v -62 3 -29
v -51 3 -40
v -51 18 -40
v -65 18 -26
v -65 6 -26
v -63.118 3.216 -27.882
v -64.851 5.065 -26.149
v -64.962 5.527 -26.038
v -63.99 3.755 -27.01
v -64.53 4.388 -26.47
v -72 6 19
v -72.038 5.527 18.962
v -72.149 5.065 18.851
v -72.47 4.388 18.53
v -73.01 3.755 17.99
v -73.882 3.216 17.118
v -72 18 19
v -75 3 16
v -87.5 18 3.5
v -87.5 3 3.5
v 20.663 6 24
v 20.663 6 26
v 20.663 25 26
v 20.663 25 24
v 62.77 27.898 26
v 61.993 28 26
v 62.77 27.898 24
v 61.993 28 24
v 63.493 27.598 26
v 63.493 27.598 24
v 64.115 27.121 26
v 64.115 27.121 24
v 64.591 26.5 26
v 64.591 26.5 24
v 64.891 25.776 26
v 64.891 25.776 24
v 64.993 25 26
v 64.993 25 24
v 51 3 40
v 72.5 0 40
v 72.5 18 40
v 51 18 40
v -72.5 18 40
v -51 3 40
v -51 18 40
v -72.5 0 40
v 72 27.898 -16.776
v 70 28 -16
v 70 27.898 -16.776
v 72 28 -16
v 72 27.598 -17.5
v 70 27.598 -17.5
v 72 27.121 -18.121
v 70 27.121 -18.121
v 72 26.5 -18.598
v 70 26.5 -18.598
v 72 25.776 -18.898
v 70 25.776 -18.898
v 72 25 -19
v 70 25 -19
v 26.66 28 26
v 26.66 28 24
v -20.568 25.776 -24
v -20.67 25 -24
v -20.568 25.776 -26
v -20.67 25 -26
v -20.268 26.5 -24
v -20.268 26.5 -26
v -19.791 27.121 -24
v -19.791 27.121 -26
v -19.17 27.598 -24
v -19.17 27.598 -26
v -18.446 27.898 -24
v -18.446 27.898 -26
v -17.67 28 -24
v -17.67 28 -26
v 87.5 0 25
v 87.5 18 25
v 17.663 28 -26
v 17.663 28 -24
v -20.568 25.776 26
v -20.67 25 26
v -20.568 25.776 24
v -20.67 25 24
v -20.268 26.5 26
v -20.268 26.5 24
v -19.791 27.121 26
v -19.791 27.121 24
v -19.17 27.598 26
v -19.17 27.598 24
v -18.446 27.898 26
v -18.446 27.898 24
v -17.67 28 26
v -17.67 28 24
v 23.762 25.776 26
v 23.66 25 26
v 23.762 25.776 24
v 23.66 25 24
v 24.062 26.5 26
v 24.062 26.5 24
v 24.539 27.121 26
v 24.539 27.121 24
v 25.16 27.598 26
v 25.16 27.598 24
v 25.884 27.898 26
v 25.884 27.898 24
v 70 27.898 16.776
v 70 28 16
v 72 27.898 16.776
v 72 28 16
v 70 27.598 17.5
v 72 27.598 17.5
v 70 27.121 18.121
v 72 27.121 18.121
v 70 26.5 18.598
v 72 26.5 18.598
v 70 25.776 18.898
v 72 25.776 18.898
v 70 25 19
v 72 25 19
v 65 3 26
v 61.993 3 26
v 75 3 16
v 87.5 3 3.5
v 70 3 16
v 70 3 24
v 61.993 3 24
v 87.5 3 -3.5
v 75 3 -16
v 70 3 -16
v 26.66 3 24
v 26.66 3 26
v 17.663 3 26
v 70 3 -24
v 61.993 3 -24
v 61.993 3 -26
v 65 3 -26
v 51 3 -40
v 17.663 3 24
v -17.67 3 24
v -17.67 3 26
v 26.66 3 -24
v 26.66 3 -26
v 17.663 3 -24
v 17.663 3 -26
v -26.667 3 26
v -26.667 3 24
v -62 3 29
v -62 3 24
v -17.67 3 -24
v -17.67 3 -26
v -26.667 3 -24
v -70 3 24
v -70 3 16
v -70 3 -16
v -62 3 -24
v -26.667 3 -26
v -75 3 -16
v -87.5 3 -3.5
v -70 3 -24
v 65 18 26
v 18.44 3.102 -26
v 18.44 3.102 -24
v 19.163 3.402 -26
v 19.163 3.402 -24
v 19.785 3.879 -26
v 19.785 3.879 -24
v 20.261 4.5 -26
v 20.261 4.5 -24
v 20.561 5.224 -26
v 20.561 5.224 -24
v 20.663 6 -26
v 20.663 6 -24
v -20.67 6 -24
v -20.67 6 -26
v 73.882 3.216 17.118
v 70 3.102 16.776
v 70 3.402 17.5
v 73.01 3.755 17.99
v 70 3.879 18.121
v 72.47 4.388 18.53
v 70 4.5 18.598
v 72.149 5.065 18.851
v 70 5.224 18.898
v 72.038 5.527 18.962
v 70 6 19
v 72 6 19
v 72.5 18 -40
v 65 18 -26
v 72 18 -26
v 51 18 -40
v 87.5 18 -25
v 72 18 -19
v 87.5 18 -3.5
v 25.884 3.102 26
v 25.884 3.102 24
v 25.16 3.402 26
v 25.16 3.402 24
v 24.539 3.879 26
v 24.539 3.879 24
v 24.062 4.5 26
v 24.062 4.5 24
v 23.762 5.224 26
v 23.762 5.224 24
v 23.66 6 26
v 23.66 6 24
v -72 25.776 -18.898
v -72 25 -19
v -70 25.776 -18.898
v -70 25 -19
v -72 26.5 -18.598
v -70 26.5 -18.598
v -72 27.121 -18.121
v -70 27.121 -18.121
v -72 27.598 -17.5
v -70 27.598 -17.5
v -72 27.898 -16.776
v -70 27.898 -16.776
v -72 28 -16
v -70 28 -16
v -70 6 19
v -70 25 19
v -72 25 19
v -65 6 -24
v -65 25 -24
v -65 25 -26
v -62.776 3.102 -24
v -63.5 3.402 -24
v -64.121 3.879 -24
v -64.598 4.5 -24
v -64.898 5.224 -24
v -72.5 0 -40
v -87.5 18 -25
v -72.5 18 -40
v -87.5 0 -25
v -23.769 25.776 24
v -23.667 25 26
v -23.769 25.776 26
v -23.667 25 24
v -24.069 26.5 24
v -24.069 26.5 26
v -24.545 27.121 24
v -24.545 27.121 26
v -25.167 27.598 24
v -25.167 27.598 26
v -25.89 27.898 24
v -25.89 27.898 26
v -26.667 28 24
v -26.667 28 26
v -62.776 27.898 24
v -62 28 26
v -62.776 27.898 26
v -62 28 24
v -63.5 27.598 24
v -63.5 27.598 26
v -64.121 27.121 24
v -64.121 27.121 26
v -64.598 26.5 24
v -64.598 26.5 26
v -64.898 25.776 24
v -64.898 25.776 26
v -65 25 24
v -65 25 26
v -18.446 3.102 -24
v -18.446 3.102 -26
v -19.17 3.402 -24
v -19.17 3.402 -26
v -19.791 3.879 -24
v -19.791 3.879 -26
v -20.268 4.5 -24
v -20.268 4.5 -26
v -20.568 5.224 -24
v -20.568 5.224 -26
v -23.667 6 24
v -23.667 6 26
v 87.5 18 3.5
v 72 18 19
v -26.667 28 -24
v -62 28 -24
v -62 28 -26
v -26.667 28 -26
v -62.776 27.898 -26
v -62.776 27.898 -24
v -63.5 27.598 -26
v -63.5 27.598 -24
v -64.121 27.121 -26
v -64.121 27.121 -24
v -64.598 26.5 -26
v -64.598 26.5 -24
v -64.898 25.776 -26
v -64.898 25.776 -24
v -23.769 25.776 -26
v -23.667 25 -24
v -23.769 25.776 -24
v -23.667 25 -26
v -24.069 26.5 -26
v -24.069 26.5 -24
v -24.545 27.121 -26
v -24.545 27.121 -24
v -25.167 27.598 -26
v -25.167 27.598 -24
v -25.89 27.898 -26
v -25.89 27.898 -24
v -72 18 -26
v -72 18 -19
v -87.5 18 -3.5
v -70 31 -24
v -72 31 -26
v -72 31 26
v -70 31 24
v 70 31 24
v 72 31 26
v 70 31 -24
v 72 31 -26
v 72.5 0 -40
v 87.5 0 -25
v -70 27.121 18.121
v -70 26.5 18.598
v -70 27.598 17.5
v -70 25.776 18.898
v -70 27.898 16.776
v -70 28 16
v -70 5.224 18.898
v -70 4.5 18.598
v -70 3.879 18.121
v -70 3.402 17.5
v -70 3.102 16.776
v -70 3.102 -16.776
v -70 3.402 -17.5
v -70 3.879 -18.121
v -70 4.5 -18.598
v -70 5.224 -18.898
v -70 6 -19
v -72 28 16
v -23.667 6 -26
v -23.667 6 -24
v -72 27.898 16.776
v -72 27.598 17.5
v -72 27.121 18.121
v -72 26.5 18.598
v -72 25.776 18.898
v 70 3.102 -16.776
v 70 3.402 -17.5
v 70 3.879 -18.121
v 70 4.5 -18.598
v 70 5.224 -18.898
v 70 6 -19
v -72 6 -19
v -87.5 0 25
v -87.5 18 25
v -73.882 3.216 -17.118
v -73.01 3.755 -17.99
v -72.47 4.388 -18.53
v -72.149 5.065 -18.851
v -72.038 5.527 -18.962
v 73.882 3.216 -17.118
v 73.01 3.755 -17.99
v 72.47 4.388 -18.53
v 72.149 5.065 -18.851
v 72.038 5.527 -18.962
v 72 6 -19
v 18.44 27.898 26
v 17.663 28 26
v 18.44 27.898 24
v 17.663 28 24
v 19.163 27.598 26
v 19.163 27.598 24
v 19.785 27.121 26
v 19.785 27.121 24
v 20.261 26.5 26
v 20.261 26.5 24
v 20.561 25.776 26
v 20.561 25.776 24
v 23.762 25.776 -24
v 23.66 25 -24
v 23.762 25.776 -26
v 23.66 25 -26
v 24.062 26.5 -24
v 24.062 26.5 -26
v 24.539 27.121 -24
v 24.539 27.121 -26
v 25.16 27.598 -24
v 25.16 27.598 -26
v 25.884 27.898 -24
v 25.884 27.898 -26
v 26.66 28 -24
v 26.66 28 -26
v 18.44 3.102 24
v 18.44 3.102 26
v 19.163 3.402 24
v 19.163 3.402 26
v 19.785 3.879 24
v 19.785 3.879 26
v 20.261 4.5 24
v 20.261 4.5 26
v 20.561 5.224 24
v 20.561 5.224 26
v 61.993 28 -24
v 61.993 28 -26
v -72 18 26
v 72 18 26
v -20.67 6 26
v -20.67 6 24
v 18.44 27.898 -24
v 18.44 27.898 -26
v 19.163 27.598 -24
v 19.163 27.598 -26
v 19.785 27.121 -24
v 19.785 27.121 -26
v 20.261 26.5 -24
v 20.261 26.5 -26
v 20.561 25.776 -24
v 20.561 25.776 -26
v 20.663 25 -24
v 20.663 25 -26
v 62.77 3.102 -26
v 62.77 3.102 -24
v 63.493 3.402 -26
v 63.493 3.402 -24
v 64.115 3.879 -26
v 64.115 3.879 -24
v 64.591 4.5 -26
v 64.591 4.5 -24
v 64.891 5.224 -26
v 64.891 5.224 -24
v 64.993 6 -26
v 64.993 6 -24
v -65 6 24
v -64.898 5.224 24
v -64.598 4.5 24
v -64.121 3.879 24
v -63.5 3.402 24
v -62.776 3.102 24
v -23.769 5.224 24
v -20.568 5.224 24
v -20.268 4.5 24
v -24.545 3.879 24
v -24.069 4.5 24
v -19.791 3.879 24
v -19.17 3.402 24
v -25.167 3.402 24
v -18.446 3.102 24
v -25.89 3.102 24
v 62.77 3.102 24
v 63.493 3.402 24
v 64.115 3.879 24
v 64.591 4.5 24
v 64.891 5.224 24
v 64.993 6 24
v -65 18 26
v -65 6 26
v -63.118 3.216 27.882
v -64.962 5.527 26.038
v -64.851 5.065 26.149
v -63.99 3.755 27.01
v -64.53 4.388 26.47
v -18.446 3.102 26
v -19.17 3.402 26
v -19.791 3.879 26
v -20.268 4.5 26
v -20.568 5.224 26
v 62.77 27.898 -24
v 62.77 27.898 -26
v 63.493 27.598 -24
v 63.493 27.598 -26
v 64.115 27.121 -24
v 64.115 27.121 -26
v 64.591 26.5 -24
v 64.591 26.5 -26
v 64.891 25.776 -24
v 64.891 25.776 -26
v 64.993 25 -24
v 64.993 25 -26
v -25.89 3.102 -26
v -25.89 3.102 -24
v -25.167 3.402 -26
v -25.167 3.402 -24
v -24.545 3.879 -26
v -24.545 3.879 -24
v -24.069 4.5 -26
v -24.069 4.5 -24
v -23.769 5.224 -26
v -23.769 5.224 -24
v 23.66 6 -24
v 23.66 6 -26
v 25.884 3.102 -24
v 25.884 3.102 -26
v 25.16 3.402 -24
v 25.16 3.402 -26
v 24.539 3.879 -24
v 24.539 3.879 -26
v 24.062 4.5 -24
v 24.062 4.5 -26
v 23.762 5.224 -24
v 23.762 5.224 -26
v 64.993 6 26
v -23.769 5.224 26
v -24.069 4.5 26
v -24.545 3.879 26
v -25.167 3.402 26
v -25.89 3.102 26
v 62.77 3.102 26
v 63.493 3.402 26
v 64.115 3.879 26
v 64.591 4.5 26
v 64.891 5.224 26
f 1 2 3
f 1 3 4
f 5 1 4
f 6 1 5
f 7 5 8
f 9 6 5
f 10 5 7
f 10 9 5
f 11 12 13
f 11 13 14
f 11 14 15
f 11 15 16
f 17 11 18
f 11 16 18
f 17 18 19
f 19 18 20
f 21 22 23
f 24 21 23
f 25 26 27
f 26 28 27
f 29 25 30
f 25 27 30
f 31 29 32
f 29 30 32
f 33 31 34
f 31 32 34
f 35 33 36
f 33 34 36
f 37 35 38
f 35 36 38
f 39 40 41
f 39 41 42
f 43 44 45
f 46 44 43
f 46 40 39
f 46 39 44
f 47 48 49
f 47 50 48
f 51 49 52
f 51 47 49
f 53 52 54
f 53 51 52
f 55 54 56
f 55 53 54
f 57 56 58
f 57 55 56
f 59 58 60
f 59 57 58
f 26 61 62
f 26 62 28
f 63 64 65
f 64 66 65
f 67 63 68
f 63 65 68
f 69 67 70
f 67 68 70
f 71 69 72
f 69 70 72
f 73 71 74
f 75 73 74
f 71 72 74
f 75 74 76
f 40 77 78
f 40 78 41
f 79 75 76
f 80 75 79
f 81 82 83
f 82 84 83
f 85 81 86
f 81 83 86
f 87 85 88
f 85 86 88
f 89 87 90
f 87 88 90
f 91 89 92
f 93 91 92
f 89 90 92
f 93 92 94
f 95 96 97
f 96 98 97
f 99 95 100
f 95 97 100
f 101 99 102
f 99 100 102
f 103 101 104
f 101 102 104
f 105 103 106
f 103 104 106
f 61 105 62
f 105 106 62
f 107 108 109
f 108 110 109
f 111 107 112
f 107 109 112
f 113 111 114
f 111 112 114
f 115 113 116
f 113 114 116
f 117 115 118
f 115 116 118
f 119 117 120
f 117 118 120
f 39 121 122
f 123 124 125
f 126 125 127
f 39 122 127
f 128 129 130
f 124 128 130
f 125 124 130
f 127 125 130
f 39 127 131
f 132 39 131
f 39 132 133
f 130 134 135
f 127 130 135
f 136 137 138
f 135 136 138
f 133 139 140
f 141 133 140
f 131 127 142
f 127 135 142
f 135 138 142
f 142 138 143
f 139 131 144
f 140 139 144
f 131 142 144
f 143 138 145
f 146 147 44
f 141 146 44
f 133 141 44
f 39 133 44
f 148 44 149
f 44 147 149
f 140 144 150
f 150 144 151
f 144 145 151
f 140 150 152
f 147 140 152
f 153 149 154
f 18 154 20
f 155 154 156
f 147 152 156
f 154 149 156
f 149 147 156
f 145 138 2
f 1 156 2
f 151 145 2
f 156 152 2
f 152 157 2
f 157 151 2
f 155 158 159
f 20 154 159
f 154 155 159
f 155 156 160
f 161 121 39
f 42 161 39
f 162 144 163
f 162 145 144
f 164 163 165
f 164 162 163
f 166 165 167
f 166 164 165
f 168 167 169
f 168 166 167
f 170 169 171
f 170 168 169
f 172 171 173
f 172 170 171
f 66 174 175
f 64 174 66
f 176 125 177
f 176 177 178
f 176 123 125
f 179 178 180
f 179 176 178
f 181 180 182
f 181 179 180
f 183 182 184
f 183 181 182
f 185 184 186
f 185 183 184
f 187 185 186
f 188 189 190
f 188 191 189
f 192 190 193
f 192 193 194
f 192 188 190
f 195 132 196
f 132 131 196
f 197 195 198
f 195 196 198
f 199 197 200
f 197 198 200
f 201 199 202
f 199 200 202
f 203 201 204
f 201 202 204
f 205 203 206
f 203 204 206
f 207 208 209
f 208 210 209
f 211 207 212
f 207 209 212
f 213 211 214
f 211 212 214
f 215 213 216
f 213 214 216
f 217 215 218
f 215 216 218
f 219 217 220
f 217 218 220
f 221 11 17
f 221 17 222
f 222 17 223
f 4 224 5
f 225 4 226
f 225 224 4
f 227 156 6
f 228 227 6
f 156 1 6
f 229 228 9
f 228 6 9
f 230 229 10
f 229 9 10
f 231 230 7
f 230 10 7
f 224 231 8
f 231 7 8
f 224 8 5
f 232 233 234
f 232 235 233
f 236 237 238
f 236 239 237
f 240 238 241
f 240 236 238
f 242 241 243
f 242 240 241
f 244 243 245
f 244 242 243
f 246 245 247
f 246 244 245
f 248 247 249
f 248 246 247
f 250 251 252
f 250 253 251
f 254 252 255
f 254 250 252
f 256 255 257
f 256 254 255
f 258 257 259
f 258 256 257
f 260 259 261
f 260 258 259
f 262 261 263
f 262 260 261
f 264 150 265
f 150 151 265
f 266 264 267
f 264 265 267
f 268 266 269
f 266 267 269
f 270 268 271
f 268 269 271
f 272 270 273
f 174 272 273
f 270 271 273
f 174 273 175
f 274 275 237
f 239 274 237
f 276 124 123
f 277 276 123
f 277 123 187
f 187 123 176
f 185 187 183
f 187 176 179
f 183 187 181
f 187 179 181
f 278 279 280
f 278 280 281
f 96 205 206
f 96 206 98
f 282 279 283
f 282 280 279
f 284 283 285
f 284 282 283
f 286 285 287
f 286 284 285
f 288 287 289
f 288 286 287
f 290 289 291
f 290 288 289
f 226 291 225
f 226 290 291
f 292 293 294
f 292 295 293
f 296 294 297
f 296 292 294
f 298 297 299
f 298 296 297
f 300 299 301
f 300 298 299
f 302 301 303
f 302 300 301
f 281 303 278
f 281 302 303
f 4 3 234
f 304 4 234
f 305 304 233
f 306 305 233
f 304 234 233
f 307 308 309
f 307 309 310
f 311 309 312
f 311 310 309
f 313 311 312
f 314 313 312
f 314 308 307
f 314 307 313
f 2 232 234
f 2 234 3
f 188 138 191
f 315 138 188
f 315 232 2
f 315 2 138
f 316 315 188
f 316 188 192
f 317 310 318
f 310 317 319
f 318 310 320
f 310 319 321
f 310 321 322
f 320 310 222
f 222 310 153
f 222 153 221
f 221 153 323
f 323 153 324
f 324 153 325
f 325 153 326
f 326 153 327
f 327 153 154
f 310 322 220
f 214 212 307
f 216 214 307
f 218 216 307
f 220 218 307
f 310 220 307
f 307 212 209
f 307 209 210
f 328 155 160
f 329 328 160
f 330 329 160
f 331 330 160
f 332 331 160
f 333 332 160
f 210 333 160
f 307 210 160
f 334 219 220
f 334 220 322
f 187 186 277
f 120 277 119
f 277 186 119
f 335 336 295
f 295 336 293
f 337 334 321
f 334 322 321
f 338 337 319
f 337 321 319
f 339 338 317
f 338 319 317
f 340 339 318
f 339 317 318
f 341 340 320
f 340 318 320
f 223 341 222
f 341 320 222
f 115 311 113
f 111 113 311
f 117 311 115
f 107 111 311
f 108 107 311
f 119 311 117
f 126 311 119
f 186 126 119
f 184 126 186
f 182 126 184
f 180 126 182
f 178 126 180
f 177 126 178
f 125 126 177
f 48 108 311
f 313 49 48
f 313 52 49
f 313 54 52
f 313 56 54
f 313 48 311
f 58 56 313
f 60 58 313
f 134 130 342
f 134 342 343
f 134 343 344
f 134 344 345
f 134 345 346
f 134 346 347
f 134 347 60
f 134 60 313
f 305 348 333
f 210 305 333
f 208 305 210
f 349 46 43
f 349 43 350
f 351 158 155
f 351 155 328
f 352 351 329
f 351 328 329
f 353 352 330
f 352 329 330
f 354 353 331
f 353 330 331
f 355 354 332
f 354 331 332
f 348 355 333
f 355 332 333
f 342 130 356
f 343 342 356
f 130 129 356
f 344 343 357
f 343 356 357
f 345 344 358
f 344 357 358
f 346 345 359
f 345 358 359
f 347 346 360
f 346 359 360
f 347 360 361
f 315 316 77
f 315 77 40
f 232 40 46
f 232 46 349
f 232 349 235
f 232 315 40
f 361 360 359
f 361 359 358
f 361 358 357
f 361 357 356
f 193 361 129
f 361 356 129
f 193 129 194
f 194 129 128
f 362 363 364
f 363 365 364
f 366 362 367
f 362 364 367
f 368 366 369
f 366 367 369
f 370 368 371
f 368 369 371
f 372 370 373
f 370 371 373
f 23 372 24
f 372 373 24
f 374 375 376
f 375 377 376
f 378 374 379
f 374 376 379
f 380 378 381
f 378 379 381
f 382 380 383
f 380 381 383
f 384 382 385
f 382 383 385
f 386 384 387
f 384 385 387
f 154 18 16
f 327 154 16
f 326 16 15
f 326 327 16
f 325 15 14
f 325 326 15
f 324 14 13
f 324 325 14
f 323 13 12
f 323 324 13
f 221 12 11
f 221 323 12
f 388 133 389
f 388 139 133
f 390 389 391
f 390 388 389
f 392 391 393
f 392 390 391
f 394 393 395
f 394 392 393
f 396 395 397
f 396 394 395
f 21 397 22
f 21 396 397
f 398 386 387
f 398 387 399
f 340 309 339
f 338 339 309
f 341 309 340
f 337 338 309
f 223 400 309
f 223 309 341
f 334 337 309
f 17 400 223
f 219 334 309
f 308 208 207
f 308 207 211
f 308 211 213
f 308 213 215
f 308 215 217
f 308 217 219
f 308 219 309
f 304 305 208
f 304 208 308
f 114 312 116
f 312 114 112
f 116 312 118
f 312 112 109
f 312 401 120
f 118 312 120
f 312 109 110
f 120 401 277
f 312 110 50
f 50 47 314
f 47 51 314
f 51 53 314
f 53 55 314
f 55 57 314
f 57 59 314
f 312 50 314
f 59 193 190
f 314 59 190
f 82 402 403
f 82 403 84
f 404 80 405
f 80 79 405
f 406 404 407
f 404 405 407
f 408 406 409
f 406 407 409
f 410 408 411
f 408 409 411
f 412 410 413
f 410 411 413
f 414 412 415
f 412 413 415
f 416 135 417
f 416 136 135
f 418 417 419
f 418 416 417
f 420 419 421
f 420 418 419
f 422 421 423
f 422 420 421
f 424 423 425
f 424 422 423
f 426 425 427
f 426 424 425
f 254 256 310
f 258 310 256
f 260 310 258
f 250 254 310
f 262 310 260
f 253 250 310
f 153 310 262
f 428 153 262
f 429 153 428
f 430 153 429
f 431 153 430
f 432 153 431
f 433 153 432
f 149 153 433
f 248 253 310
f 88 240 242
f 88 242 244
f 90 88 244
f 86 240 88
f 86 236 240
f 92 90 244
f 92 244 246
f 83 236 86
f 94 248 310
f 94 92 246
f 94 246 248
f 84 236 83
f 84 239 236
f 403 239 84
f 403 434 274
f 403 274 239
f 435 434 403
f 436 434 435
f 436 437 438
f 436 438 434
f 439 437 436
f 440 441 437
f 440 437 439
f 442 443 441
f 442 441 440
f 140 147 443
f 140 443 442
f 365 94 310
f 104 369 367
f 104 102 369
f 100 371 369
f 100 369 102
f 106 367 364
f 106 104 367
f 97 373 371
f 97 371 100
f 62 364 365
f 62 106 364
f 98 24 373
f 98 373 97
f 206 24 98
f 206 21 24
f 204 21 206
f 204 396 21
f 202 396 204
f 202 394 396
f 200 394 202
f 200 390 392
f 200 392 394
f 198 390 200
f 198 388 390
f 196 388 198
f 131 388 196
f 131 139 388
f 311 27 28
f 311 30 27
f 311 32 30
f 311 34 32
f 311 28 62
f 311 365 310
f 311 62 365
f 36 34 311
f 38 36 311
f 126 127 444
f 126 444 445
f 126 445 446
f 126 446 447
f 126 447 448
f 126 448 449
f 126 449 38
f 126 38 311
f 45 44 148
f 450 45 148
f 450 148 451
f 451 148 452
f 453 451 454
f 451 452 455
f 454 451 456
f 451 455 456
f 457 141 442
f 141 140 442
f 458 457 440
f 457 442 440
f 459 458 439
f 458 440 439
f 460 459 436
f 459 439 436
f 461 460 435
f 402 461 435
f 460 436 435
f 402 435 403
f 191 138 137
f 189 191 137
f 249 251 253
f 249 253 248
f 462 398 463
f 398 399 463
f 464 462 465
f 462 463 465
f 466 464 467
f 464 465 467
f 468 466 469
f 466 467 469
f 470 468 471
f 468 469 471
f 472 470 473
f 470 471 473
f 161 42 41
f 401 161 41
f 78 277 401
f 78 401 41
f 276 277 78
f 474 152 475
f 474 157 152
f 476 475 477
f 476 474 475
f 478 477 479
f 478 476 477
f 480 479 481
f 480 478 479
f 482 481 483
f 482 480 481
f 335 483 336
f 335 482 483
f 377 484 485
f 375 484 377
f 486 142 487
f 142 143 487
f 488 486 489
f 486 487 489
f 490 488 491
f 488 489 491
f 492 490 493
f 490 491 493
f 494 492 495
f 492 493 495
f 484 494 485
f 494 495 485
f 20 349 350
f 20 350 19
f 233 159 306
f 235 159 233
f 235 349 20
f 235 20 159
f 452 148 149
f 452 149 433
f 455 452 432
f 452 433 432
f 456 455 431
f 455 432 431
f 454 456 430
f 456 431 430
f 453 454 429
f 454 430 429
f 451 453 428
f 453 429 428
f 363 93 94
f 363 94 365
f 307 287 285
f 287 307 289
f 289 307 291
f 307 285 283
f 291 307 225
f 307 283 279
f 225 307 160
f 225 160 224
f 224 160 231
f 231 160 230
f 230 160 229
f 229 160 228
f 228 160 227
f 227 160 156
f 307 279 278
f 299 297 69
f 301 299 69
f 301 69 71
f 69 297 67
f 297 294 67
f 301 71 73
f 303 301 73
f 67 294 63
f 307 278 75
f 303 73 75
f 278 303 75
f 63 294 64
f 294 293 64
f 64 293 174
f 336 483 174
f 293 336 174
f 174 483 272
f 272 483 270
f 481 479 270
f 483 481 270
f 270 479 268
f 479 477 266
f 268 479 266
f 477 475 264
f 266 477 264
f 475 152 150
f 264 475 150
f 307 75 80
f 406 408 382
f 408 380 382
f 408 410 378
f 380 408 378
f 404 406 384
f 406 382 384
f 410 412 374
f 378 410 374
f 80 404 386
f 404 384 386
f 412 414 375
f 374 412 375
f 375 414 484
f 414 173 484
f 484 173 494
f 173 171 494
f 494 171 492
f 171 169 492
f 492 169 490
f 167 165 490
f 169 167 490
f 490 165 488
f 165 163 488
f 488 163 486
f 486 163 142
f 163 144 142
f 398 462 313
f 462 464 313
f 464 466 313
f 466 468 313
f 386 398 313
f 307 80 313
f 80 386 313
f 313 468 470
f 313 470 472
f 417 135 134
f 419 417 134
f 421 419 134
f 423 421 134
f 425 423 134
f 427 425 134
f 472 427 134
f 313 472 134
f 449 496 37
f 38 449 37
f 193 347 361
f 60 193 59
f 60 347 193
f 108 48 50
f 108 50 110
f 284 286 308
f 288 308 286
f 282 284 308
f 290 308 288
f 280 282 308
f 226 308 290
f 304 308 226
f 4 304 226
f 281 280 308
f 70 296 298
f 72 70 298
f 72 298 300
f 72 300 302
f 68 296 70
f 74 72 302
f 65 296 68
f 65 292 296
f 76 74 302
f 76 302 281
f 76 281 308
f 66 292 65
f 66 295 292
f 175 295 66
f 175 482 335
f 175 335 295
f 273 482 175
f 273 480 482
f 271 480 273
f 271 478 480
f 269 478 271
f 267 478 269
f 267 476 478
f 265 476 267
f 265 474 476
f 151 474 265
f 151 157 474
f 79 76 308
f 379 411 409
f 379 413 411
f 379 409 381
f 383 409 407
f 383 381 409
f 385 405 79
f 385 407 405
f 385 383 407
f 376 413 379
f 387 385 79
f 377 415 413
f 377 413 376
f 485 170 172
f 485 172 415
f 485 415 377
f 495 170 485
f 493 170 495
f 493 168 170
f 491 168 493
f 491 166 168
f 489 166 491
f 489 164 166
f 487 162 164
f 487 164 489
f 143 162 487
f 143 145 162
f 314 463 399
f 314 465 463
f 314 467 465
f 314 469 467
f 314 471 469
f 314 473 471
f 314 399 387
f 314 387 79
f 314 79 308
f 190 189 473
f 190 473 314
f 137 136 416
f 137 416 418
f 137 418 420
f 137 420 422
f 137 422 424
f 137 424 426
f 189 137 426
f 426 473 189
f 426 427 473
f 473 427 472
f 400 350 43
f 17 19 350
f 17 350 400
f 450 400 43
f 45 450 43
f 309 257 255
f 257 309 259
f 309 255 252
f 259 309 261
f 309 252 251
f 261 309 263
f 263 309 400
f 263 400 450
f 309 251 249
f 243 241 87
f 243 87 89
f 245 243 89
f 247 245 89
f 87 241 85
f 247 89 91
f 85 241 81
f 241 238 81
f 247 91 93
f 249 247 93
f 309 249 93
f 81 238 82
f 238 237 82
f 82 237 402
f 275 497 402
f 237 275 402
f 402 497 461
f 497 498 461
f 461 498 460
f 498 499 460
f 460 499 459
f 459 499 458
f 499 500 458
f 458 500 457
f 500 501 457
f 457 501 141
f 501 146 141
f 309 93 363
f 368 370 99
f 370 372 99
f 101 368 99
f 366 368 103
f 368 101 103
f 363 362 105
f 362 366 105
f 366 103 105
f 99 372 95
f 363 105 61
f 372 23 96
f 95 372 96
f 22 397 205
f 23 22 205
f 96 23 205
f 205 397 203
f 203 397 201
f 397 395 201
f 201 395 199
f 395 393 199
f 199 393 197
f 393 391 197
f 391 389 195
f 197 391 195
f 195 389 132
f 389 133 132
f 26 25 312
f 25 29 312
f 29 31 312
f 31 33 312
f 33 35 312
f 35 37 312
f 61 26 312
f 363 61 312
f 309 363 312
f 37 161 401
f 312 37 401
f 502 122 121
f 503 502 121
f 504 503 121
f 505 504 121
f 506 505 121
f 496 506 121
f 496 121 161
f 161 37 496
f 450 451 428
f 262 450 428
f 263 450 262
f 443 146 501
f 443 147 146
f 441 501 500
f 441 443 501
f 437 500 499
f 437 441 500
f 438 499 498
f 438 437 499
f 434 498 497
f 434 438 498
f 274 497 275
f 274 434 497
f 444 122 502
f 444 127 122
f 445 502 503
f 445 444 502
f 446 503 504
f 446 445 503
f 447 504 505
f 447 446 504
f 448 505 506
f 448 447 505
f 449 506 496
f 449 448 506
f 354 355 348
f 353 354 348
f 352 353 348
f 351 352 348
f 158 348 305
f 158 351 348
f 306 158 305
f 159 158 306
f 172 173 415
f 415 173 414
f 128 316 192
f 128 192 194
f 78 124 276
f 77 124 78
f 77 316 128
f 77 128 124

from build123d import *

# Parameters (mm, degrees)
BASE_EXTRUSION_DEPTH         = 3
SKETCH_2_W                   = 144
SKETCH_2_H                   = 52
SKETCH_2_W_2                 = 140
SKETCH_2_H_2                 = 48
BATTERY_CASE_EXTRUSION_DEPTH = 28
BATTERY_CAGE_CUT_1_REACH     = 115.9
SKETCH_3_W                   = 41.333333333
SKETCH_3_H                   = 25
BATTERY_CAGE_CUT_2_REACH     = 169.336
SKETCH_4_W                   = 38
SKETCH_4_H                   = 25
EXTRUDE_1_DEPTH              = 15
FILLET_1_R                   = 3


with BuildPart() as part:
    # Эскиз1 → Base extrusion (new body)
    with BuildSketch(Plane(origin=(0, 0, 0), x_dir=(1, 0, 0), z_dir=(0, 1, 0))):
        Polygon((-87.5, 25), (-72.5, 40), (72.5, 40), (87.5, 25), (87.5, -25), (72.5, -40), (-72.5, -40), (-87.5, -25), align=None)
    extrude(amount=BASE_EXTRUSION_DEPTH)

    # Эскиз2 → Battery case extrusion (add)
    with BuildSketch(Plane(origin=(0, 3, 0), x_dir=(1, 0, 0), z_dir=(0, 1, 0))):
        Rectangle(SKETCH_2_W, SKETCH_2_H)
        Rectangle(SKETCH_2_W_2, SKETCH_2_H_2, mode=Mode.SUBTRACT)
    extrude(amount=BATTERY_CASE_EXTRUSION_DEPTH)

    # Battery cage cut 1: up to this face of the body (flat: up to its plane)
    battery_cage_cut_1_end = Plane(part.part.faces().sort_by_distance((0, 17, -26))[0])
    # Эскиз3 → Battery cage cut 1 (cut, up to the picked face)
    with BuildSketch(Plane.XY.offset(26), mode=Mode.PRIVATE) as battery_cage_cut_1_sk1:
        with Locations((-44.333333334, 15.5)):
            Rectangle(SKETCH_3_W, SKETCH_3_H)
    battery_cage_cut_1_tool1 = split(extrude(battery_cage_cut_1_sk1.sketch, amount=-BATTERY_CAGE_CUT_1_REACH, mode=Mode.PRIVATE), bisect_by=battery_cage_cut_1_end, keep=Keep.BOTH, mode=Mode.PRIVATE)
    # Эскиз3 → Battery cage cut 1 (cut, up to the picked face)
    with BuildSketch(Plane.XY.offset(26), mode=Mode.PRIVATE) as battery_cage_cut_1_sk2:
        with Locations((-0.003333334, 15.5)):
            Rectangle(SKETCH_3_W, SKETCH_3_H)
    battery_cage_cut_1_tool2 = split(extrude(battery_cage_cut_1_sk2.sketch, amount=-BATTERY_CAGE_CUT_1_REACH, mode=Mode.PRIVATE), bisect_by=battery_cage_cut_1_end, keep=Keep.BOTH, mode=Mode.PRIVATE)
    # Эскиз3 → Battery cage cut 1 (cut, up to the picked face)
    with BuildSketch(Plane.XY.offset(26), mode=Mode.PRIVATE) as battery_cage_cut_1_sk3:
        with Locations((44.326666667, 15.5)):
            Rectangle(SKETCH_3_W, SKETCH_3_H)
    battery_cage_cut_1_tool3 = split(extrude(battery_cage_cut_1_sk3.sketch, amount=-BATTERY_CAGE_CUT_1_REACH, mode=Mode.PRIVATE), bisect_by=battery_cage_cut_1_end, keep=Keep.BOTH, mode=Mode.PRIVATE)
    add(battery_cage_cut_1_tool1.solids().sort_by(Axis((-44.333333, 15.5, 26), (0, 0, -1)))[0], mode=Mode.SUBTRACT)
    add(battery_cage_cut_1_tool2.solids().sort_by(Axis((-0.003333, 15.5, 26), (0, 0, -1)))[0], mode=Mode.SUBTRACT)
    add(battery_cage_cut_1_tool3.solids().sort_by(Axis((44.326667, 15.5, 26), (0, 0, -1)))[0], mode=Mode.SUBTRACT)

    # Battery cage cut 2: up to this face of the body (flat: up to its plane)
    battery_cage_cut_2_end = Plane(part.part.faces().sort_by_distance((72, 17, 0))[0])
    # Эскиз4 → Battery cage cut 2 (cut, up to the picked face)
    with BuildSketch(Plane.ZY.offset(72), mode=Mode.PRIVATE) as battery_cage_cut_2_sk1:
        with Locations((0, 15.5)):
            Rectangle(SKETCH_4_W, SKETCH_4_H)
    battery_cage_cut_2_tool1 = split(extrude(battery_cage_cut_2_sk1.sketch, amount=-BATTERY_CAGE_CUT_2_REACH, mode=Mode.PRIVATE), bisect_by=battery_cage_cut_2_end, keep=Keep.BOTH, mode=Mode.PRIVATE)
    add(battery_cage_cut_2_tool1.solids().sort_by(Axis((-72, 15.5, 0), (1, 0, 0)))[0], mode=Mode.SUBTRACT)

    # Эскиз6 → Бобышка-Вытянуть1 (add)
    with BuildSketch(Plane(origin=(0, 3, 0), x_dir=(1, 0, 0), z_dir=(0, 1, 0))):
        Polygon((-87.5, 25), (-72.5, 40), (-51, 40), (-65, 26), (-72, 26), (-72, 19), (-87.5, 3.5), align=None)
        Polygon((65, 26), (72, 26), (72, 19), (87.5, 3.5), (87.5, 25), (72.5, 40), (51, 40), align=None)
        Polygon((-65, -26), (-72, -26), (-72, -19), (-87.5, -3.5), (-87.5, -25), (-72.5, -40), (-51, -40), align=None)
        Polygon((65, -26), (51, -40), (72.5, -40), (87.5, -25), (87.5, -3.5), (72, -19), (72, -26), align=None)
    extrude(amount=EXTRUDE_1_DEPTH)

    # Скругление1
    fillet_1_edges = [part.edges().sort_by_distance(p)[0] for p in [
        (71, 28, -19),
        (71, 3, 19),
        (71, 3, -19),
        (71, 28, 19),
        (-71, 3, -19),
        (-71, 28, -19),
        (-71, 28, 19),
        (-71, 3, 19),
        (-65, 28, -25),
        (-23.666666667, 3, -25),
        (-65, 3, -25),
        (-23.666666667, 28, -25),
        (-65, 3, 25),
        (-65, 28, 25),
        (-23.666666667, 28, 25),
        (-23.666666667, 3, 25),
        (-20.67, 28, -25),
        (20.663333333, 3, -25),
        (20.663333333, 28, -25),
        (-20.67, 3, -25),
        (-20.67, 28, 25),
        (20.663333333, 28, 25),
        (20.663333333, 3, 25),
        (-20.67, 3, 25),
        (23.66, 28, -25),
        (64.993333333, 3, -25),
        (64.993333333, 28, -25),
        (23.66, 3, -25),
        (23.66, 28, 25),
        (64.993333333, 28, 25),
        (64.993333333, 3, 25),
        (23.66, 3, 25),
    ]]
    fillet(fillet_1_edges, radius=FILLET_1_R)


solid = part.part
